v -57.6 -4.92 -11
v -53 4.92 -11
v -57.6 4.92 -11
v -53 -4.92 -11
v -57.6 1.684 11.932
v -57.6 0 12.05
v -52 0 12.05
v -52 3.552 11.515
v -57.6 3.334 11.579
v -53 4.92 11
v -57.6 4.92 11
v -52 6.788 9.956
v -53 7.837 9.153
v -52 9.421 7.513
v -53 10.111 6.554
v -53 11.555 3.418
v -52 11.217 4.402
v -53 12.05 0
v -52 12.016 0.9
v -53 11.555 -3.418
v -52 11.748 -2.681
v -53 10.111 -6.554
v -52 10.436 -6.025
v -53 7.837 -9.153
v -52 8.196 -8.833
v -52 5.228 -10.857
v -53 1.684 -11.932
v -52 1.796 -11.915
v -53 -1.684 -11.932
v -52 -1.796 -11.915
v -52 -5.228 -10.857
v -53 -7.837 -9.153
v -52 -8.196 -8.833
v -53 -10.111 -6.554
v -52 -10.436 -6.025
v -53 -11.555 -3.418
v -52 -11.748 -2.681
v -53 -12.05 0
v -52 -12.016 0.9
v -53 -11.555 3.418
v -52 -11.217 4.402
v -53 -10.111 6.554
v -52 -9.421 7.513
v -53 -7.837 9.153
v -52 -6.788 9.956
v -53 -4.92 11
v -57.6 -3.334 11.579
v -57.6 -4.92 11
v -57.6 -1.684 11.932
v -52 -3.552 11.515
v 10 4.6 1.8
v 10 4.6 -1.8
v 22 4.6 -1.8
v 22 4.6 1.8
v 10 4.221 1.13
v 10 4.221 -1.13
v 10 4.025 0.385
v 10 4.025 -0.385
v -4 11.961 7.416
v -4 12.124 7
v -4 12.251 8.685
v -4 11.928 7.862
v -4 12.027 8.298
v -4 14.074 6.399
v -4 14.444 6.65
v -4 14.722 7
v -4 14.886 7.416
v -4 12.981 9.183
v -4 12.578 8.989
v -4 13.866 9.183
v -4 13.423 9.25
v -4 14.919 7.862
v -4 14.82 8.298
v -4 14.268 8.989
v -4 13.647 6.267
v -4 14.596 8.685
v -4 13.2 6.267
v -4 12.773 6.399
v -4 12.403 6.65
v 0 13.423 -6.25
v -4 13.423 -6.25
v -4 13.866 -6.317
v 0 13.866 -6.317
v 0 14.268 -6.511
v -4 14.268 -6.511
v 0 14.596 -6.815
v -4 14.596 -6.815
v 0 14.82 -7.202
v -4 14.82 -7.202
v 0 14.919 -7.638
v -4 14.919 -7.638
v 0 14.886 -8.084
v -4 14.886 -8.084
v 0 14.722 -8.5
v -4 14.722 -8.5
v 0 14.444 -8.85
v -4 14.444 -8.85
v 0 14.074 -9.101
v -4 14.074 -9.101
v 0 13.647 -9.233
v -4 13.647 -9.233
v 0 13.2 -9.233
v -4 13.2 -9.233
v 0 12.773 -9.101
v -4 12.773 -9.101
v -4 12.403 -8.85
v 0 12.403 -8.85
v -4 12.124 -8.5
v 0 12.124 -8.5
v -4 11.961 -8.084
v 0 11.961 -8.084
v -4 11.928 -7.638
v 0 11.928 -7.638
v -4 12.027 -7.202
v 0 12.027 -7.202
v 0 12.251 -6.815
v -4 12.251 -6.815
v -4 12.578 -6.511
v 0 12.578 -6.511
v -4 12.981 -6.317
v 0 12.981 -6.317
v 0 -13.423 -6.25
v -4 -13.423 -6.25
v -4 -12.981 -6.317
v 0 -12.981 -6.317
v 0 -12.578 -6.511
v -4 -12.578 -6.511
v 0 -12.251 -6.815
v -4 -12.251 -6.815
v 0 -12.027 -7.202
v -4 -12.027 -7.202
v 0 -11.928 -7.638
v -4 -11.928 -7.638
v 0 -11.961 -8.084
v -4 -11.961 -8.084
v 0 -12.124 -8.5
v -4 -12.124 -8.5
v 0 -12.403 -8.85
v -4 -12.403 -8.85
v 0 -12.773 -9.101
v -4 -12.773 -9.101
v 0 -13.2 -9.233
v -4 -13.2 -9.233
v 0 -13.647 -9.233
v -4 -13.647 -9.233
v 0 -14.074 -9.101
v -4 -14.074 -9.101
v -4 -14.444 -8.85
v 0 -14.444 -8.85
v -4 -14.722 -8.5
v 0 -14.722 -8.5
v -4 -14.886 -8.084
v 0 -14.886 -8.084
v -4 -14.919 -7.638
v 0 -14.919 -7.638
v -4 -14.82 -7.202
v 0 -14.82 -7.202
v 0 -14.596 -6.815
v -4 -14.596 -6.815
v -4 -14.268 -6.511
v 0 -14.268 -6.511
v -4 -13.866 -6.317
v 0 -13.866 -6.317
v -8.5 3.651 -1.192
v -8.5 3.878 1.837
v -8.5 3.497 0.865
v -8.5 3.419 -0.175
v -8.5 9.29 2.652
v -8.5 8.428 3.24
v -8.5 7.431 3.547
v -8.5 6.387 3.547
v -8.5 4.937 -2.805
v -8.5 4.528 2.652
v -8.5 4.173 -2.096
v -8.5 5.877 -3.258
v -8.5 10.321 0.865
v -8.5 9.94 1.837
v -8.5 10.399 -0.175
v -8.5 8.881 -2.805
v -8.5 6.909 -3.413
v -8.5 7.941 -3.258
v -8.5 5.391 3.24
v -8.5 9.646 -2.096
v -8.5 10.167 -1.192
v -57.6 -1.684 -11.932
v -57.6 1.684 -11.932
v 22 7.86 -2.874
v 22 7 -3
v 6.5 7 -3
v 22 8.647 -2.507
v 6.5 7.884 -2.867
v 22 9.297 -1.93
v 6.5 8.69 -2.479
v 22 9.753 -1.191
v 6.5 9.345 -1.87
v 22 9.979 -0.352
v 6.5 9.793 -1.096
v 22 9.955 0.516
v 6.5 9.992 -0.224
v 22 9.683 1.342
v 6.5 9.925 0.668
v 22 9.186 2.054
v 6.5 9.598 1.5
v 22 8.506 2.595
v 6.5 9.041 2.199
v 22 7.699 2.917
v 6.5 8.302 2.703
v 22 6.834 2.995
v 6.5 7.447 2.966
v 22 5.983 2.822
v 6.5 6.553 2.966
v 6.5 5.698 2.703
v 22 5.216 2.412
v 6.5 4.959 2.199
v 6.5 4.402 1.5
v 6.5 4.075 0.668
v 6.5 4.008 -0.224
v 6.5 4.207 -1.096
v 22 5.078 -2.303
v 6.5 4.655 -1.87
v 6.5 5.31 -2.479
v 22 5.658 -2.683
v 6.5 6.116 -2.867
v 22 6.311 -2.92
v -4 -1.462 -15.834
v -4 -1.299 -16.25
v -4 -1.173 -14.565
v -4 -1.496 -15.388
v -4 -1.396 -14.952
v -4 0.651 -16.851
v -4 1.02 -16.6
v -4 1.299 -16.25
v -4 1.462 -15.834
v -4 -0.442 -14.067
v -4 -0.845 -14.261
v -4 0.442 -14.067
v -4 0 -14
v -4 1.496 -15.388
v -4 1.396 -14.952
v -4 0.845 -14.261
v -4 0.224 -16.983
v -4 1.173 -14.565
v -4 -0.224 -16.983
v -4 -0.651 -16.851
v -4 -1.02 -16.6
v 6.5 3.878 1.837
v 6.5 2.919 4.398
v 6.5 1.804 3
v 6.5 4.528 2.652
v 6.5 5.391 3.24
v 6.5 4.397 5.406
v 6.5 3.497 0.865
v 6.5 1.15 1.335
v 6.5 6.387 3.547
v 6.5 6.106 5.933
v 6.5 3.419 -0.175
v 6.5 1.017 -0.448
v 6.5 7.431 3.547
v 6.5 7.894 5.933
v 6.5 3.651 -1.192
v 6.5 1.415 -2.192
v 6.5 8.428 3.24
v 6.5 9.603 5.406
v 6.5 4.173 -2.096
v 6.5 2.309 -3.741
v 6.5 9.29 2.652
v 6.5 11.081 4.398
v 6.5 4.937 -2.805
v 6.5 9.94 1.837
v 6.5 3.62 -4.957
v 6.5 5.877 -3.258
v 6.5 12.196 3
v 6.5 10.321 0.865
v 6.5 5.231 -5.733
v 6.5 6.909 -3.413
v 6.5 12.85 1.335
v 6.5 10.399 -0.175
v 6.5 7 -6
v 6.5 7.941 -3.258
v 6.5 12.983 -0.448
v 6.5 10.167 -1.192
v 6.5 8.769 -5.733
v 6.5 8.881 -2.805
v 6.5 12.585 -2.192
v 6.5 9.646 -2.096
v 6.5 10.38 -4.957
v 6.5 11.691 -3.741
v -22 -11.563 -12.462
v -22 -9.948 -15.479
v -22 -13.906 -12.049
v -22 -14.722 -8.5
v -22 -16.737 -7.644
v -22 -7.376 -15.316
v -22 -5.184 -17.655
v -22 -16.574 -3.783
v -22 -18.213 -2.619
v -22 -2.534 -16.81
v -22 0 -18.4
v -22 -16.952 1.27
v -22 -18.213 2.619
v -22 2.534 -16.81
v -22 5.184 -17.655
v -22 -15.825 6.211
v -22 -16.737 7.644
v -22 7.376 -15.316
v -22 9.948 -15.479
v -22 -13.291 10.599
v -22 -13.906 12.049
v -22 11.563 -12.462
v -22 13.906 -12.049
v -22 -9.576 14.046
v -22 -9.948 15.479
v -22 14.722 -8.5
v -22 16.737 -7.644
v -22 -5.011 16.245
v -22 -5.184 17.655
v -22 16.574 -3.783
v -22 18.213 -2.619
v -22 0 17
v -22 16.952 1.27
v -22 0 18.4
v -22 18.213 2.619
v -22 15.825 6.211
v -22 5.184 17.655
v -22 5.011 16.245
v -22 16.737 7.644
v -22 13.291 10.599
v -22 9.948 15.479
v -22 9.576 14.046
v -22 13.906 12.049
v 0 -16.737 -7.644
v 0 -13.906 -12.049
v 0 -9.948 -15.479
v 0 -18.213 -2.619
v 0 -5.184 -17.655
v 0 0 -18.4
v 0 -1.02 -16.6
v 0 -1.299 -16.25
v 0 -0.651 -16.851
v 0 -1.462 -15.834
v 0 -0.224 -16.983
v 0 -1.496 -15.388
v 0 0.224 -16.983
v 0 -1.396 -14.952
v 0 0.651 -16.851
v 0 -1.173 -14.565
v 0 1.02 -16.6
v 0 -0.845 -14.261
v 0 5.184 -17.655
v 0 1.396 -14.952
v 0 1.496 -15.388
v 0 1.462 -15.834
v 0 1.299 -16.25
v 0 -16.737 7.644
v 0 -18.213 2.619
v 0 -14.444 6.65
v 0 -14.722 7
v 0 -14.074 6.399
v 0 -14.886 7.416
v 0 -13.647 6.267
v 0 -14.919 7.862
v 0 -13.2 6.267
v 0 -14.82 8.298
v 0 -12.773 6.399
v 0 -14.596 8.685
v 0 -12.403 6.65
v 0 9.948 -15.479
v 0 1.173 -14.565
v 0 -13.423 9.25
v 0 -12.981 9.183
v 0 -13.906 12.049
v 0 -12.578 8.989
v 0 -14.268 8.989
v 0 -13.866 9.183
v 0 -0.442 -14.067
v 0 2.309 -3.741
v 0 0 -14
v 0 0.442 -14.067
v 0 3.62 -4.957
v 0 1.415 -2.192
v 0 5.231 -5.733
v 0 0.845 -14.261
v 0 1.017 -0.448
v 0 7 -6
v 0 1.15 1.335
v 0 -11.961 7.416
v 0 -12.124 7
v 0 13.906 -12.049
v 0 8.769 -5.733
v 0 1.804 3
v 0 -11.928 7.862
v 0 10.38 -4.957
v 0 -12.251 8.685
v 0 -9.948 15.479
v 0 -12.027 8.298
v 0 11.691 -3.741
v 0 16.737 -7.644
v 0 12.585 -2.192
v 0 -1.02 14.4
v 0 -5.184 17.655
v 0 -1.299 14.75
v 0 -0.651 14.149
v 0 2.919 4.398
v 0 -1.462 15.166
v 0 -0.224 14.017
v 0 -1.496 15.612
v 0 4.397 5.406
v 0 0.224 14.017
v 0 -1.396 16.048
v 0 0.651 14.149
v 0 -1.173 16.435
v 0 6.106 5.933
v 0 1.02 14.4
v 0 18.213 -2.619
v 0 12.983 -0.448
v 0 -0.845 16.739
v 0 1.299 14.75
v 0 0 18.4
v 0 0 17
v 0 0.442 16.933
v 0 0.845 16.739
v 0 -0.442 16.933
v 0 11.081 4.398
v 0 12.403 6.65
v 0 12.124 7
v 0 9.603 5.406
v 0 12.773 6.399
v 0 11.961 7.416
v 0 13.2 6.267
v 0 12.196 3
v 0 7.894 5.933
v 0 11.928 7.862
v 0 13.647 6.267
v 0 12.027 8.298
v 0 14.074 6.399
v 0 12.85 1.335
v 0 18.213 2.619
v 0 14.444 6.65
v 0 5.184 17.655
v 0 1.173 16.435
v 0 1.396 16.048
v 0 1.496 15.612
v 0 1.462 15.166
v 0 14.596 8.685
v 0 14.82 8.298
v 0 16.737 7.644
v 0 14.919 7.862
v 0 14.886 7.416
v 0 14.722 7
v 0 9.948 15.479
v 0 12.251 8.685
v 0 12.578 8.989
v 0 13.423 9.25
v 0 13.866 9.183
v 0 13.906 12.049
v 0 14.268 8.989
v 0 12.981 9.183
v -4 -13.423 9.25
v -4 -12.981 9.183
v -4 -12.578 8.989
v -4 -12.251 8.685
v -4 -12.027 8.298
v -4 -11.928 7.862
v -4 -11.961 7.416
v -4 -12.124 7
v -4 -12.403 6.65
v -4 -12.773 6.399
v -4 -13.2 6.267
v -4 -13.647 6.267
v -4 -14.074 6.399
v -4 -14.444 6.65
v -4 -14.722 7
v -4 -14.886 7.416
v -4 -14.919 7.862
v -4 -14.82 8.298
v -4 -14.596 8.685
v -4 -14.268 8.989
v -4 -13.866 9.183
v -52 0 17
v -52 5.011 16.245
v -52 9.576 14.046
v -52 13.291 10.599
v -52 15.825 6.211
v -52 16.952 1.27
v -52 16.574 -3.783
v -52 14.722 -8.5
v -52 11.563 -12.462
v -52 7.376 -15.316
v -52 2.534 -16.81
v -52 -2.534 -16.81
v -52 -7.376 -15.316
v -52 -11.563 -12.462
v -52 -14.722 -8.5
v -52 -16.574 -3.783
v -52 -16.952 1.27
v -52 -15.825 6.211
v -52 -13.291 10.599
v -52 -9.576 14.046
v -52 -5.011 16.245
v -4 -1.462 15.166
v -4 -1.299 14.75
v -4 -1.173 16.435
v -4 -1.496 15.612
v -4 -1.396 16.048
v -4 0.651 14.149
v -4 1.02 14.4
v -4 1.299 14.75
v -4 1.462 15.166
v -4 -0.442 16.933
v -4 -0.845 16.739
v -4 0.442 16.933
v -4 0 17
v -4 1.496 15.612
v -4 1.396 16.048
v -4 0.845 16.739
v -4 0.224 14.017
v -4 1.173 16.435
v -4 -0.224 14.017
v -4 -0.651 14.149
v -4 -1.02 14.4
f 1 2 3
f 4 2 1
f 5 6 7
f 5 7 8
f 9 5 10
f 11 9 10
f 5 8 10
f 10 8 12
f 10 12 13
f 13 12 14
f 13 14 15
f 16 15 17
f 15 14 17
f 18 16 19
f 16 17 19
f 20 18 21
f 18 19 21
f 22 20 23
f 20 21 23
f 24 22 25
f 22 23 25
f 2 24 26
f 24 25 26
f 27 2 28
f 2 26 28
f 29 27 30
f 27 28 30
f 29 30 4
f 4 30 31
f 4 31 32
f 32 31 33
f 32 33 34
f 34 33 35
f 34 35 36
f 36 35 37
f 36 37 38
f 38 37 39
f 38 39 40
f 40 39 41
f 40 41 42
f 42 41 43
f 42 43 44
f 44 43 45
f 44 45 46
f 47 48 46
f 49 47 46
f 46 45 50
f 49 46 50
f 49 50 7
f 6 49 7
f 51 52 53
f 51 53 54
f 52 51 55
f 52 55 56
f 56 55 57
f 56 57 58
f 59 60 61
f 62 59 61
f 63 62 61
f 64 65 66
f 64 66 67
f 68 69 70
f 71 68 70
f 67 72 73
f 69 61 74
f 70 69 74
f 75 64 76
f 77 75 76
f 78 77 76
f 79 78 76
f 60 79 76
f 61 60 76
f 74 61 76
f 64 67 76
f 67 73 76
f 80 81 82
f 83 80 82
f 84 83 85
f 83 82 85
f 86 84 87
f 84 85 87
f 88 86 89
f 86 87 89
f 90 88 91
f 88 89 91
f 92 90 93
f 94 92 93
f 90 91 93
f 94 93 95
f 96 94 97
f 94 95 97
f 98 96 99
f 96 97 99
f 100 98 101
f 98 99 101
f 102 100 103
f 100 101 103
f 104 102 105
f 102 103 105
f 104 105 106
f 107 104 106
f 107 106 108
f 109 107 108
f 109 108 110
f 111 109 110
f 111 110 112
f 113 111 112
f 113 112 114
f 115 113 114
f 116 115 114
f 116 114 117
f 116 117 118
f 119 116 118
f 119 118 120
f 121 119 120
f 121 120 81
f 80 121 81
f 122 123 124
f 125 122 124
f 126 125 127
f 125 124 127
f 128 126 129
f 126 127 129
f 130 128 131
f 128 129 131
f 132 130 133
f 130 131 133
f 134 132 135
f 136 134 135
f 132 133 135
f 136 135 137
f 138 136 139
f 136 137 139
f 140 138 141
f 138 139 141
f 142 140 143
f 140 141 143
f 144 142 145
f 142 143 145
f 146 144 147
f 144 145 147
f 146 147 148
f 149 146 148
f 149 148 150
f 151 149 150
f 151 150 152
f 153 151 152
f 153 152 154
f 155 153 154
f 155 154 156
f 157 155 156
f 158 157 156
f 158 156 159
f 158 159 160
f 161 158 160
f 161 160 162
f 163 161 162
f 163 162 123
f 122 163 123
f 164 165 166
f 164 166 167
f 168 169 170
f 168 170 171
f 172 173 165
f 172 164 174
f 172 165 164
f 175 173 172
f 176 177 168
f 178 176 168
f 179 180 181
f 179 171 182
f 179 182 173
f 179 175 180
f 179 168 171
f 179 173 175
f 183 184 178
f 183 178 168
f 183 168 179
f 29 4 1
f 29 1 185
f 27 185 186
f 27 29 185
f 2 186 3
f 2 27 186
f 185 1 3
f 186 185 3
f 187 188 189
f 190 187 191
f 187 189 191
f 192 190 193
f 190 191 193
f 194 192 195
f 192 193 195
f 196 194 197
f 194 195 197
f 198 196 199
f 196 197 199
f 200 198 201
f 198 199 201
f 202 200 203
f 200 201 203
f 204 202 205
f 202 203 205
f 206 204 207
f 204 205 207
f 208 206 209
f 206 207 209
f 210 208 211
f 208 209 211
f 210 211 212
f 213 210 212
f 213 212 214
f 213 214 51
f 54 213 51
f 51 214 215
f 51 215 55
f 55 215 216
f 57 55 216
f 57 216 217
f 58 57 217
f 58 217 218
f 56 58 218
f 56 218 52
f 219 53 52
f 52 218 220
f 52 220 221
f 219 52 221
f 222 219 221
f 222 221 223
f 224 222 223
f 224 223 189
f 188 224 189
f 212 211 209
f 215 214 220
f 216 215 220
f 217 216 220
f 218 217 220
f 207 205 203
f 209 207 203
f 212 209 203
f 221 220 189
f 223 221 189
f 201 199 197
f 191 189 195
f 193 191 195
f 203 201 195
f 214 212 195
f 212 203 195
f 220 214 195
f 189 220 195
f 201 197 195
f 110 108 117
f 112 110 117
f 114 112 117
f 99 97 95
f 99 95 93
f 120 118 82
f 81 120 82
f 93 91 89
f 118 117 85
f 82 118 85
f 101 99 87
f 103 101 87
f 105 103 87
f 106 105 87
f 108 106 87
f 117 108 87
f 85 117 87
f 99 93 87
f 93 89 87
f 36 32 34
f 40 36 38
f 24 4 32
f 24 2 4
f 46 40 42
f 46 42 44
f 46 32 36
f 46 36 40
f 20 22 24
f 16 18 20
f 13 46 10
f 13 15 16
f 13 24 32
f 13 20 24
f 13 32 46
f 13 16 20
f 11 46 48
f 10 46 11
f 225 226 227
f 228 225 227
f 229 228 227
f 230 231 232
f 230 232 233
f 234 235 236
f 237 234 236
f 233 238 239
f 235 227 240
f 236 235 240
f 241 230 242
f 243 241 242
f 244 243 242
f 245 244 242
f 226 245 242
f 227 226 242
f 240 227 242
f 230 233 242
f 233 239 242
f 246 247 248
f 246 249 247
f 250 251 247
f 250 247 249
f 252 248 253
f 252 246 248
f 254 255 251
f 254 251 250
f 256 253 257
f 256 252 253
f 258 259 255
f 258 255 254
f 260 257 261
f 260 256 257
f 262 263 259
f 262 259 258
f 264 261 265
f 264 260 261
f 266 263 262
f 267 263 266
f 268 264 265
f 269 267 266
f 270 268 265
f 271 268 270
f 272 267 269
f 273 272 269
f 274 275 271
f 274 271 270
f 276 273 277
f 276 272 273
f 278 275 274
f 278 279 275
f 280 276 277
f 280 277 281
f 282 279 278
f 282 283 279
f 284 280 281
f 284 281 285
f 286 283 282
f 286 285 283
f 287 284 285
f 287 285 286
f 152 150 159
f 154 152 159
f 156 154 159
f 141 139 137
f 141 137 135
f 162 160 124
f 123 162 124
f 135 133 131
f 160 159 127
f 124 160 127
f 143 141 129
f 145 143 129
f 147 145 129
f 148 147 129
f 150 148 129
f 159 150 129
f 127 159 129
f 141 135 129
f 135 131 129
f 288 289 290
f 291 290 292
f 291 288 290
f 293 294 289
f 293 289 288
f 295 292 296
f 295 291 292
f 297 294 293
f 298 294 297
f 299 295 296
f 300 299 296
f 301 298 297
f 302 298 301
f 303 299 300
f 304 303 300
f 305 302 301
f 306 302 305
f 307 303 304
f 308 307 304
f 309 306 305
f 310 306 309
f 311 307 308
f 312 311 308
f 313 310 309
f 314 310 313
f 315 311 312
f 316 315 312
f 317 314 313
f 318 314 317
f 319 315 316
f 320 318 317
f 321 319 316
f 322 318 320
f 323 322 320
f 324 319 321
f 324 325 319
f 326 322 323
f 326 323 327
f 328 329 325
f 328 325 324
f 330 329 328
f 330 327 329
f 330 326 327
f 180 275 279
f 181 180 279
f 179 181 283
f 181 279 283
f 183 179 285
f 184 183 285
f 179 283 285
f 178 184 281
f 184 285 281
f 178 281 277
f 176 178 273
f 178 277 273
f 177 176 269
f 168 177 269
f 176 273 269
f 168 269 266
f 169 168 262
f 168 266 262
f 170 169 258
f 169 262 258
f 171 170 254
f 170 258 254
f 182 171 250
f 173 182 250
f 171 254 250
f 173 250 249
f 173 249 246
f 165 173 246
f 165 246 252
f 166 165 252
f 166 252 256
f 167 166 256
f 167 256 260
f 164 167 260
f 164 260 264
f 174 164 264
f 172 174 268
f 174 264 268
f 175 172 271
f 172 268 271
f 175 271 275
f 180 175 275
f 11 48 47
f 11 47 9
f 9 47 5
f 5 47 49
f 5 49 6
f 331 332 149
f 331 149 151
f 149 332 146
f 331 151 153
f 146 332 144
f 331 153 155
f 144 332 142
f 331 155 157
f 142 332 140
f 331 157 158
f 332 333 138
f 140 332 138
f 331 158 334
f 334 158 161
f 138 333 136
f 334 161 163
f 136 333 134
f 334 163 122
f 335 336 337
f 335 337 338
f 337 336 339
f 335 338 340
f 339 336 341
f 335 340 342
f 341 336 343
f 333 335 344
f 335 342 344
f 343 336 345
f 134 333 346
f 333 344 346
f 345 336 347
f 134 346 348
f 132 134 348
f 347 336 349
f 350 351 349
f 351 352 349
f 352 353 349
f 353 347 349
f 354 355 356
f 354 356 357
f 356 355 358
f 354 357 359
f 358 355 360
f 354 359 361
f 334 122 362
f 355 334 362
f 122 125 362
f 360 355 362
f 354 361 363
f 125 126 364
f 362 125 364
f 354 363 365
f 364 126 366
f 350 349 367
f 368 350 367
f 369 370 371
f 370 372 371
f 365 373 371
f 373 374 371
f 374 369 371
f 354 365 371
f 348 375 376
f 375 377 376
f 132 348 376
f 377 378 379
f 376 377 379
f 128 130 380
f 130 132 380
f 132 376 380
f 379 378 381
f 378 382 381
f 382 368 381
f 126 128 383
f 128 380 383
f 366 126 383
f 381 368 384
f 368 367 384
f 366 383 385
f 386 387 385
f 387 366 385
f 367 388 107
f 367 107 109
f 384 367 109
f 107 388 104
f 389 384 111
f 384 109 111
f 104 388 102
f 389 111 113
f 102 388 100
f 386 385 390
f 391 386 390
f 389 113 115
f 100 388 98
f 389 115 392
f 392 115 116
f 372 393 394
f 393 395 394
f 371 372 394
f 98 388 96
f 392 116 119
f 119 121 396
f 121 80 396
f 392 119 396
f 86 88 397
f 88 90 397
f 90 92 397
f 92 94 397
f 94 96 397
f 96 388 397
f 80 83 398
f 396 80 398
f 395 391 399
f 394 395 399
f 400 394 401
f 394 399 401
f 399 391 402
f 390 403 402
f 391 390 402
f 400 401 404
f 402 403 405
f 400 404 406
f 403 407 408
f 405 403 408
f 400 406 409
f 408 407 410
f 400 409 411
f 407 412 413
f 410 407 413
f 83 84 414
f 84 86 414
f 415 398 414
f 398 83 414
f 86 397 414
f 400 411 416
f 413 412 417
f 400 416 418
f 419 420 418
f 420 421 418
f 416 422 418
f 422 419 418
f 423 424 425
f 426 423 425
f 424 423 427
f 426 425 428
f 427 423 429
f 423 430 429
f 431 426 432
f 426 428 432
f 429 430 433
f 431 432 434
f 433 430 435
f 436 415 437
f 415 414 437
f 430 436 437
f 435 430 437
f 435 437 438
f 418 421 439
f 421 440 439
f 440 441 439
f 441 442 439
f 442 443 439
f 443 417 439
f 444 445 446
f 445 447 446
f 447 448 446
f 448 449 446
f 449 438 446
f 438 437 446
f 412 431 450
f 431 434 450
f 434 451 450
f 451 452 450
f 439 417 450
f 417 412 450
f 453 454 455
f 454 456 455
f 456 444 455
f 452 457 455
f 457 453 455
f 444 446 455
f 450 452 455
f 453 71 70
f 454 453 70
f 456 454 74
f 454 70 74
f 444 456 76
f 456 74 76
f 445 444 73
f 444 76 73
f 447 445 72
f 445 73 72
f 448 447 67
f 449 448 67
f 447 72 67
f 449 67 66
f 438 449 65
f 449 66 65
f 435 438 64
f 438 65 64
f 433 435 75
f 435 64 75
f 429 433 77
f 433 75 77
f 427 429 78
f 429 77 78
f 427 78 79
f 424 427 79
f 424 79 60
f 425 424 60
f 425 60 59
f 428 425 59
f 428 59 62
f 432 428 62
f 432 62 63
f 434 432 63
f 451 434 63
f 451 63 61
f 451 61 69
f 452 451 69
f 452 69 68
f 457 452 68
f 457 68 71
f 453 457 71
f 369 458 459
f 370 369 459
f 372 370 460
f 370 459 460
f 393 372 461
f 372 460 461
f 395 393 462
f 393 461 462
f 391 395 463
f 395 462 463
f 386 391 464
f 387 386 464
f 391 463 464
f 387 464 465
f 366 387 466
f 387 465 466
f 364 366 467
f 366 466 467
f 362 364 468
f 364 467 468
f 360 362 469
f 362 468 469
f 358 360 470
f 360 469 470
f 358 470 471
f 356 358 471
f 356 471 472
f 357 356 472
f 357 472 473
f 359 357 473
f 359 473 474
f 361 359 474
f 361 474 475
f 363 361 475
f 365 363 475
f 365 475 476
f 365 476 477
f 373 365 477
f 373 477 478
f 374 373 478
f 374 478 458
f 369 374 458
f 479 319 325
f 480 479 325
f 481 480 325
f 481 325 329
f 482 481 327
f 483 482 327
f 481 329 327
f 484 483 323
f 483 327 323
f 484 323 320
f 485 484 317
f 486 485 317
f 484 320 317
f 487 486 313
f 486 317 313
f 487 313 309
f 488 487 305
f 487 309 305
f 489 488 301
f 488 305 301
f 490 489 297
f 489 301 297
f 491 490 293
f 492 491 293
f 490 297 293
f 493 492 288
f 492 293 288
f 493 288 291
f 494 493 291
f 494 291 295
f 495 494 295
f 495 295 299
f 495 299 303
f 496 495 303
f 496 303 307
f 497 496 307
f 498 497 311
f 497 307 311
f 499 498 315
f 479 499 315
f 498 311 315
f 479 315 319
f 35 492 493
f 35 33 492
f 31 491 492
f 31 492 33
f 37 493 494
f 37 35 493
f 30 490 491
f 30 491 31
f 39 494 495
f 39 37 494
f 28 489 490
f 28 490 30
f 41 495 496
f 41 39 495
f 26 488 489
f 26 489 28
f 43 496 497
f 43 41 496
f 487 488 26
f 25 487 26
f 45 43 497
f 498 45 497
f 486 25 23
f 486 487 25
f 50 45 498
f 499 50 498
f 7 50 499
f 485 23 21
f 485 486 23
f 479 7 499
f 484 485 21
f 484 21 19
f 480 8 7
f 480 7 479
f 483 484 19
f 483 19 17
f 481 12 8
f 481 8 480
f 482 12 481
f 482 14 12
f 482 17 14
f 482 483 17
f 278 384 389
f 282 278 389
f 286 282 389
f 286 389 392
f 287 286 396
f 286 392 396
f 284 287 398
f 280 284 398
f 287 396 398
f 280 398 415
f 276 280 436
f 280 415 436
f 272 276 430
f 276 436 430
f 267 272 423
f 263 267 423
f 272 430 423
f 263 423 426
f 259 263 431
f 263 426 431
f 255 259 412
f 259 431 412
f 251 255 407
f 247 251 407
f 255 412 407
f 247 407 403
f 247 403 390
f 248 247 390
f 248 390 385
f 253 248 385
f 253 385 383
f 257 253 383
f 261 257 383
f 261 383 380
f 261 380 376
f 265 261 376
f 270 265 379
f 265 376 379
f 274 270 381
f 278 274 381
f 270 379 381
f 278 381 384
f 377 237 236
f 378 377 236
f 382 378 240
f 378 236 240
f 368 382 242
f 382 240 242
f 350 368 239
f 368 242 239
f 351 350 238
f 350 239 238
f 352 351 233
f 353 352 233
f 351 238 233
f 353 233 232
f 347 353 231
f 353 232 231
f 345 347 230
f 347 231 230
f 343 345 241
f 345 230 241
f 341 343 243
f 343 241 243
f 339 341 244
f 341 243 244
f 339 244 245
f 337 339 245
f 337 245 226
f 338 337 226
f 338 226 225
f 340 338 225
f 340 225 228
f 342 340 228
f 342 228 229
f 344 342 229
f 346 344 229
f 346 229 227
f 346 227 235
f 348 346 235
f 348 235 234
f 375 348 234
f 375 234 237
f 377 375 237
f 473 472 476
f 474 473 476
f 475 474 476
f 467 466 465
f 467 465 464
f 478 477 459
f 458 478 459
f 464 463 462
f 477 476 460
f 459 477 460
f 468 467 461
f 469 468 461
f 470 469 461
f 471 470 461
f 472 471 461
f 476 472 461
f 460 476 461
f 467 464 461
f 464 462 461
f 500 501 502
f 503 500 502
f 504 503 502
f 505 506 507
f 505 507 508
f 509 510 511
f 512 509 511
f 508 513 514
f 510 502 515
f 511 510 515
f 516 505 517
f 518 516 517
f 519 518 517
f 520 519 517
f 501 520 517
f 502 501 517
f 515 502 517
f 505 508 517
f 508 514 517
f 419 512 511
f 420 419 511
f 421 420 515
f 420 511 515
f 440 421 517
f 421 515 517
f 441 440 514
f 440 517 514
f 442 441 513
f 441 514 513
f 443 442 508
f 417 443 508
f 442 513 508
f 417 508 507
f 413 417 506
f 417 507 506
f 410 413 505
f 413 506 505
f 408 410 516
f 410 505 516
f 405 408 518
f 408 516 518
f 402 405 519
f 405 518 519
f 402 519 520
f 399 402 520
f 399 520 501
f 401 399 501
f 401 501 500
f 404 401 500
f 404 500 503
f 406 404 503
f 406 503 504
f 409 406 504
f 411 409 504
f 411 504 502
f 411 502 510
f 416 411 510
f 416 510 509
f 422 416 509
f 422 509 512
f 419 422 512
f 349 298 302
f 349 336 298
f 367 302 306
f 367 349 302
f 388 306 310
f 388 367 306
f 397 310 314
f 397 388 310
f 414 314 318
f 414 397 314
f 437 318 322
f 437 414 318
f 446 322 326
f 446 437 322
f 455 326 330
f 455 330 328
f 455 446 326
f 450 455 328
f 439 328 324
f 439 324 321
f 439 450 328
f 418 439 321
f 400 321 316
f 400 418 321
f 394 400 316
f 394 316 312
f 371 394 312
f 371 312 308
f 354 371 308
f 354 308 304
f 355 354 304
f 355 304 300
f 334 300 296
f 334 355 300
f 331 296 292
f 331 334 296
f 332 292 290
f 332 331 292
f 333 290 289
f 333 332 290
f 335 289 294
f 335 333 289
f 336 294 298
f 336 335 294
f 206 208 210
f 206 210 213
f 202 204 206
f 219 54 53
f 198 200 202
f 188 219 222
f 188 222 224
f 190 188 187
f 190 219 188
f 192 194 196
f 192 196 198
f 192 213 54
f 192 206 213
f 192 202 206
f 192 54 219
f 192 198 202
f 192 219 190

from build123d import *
from build123d.topology import SkipClean

# Parameters (mm, degrees)
ESQUISSE1_W                       = 22
ESQUISSE1_H                       = 18.4
ESQUISSE2_R                       = 17
BOSS_EXTRU_1_DEPTH                = 30
ESQUISSE3_R                       = 12.05
BOSS_EXTRU_2_DEPTH                = 5.6
ENL_V_START                       = -4.6
ENL_V_MAT_EXTRU_1_DEPTH           = 4.6
BOSS_EXTRU_3_DEPTH                = 4.6
ESQUISSE6_R                       = 6
BOSS_EXTRU_4_DEPTH                = 6.5
ESQUISSE7_R                       = 3
BOSS_EXTRU_5_DEPTH                = 15.5
ENL_V_START_2                     = -12
ENL_V_MAT_EXTRU_2_DEPTH           = 12
DIAM_TRE_DU_PER_AGE_3_0_3_1_D     = 3
DIAM_TRE_DU_PER_AGE_3_0_3_1_DEPTH = 4
ENL_V_START_3                     = -15.5
ESQUISSE12_R                      = 3.5
ENL_V_MAT_EXTRU_3_DEPTH           = 15


with BuildPart() as part:
    # Esquisse1 → Révolution1 (revolve)
    with BuildSketch(Plane.XY, mode=Mode.PRIVATE) as r_volution1_sk:
        with Locations((-11, 9.2)):
            Rectangle(ESQUISSE1_W, ESQUISSE1_H)
    revolve(r_volution1_sk.sketch.rotate(Axis((-22, 0, 0), (1, 0, 0)), 270), axis=Axis((-22, 0, 0), (1, 0, 0)))

    # Esquisse2 → Boss.-Extru.1 (add)
    with BuildSketch(Plane.ZY.offset(22)):
        Circle(ESQUISSE2_R)
    extrude(amount=BOSS_EXTRU_1_DEPTH)

    # Esquisse3 → Boss.-Extru.2 (add)
    with BuildSketch(Plane.ZY.offset(52)):
        Circle(ESQUISSE3_R)
    extrude(amount=BOSS_EXTRU_2_DEPTH)

    # Esquisse4 → Enlèv. mat.-Extru.1 (cut)
    with BuildSketch(Plane.ZY.offset(57.6).offset(ENL_V_START)):
        with BuildLine():
            Line((11, -4.919603643), (11, 4.919603643))
            ThreePointArc((11, 4.919603643), (-12.05, 0), (11, -4.919603643))
        make_face()
    extrude(amount=ENL_V_MAT_EXTRU_1_DEPTH, mode=Mode.SUBTRACT)

    # Esquisse5 → Boss.-Extru.3 (add)
    with SkipClean():  # the faces are left unmerged after this step: merging them gives an invalid solid
        with BuildSketch(Plane.ZY.offset(53)):
            with BuildLine():
                Line((-11, 4.919603643), (-11, -4.919603643))
                ThreePointArc((-11, -4.919603643), (-12.05, 0), (-11, 4.919603643))
            make_face()
        extrude(amount=BOSS_EXTRU_3_DEPTH)

    # Esquisse6 → Boss.-Extru.4 (add)
    with SkipClean():  # the faces are left unmerged after this step: merging them gives an invalid solid
        with BuildSketch(Plane(origin=(0, 0, 0), x_dir=(0, 0, -1), z_dir=(1, 0, 0))):
            with Locations((0, 7)):
                Circle(ESQUISSE6_R)
        extrude(amount=BOSS_EXTRU_4_DEPTH)

    # Esquisse7 → Boss.-Extru.5 (add)
    with SkipClean():  # the faces are left unmerged after this step: merging them gives an invalid solid
        with BuildSketch(Plane(origin=(6.5, 0, 0), x_dir=(0, 0, -1), z_dir=(1, 0, 0))):
            with Locations((0, 7)):
                Circle(ESQUISSE7_R)
        extrude(amount=BOSS_EXTRU_5_DEPTH)

    # Esquisse8 → Enlèv. mat.-Extru.2 (cut)
    with SkipClean():  # the faces are left unmerged after this step: merging them gives an invalid solid
        with BuildSketch(Plane(origin=(22, 0, 0), x_dir=(0, 0, -1), z_dir=(1, 0, 0)).offset(ENL_V_START_2)):
            with BuildLine():
                Line((1.8, 4.6), (-1.8, 4.6))
                ThreePointArc((-1.8, 4.6), (0, 4), (1.8, 4.6))
            make_face()
        extrude(amount=ENL_V_MAT_EXTRU_2_DEPTH, mode=Mode.SUBTRACT)

    # Diamètre du perçage Ø3.0 (3)1
    with Locations(Plane(origin=(0, 0, 0), x_dir=(0, 0, -1), z_dir=(1, 0, 0))):
        with Locations((15.5, 0), (-7.75, -13.423393759), (-7.75, 13.423393759), (7.75, -13.423393759), (7.75, 13.423393759), (-15.5, 0)):
            Hole(DIAM_TRE_DU_PER_AGE_3_0_3_1_D / 2, depth=DIAM_TRE_DU_PER_AGE_3_0_3_1_DEPTH)

    # Esquisse12 → Enlèv. mat.-Extru.3 (cut)
    with SkipClean():  # the faces are left unmerged after this step: merging them gives an invalid solid
        with BuildSketch(Plane(origin=(22, 0, 0), x_dir=(0, 0, -1), z_dir=(1, 0, 0)).offset(ENL_V_START_3)):
            with Locations((-0.08652583, 6.909100079)):
                Circle(ESQUISSE12_R)
        extrude(amount=-ENL_V_MAT_EXTRU_3_DEPTH, mode=Mode.SUBTRACT)


with BuildPart() as enl_v_mat_extru_3_piece_1:
    # of the separate pieces the step leaves, piece 1, a body of its own (enl_v_mat_extru_3_pieces)
    add(part.part.solids().sort_by_distance((-22, 0, -18.4))[0])


with BuildPart() as enl_v_mat_extru_3_piece_2:
    # of the separate pieces the step leaves, piece 2, a body of its own (enl_v_mat_extru_3_pieces)
    add(part.part.solids().sort_by_distance((6.5, 7, -3))[0])


solid = Compound([enl_v_mat_extru_3_piece_1.part, enl_v_mat_extru_3_piece_2.part])
